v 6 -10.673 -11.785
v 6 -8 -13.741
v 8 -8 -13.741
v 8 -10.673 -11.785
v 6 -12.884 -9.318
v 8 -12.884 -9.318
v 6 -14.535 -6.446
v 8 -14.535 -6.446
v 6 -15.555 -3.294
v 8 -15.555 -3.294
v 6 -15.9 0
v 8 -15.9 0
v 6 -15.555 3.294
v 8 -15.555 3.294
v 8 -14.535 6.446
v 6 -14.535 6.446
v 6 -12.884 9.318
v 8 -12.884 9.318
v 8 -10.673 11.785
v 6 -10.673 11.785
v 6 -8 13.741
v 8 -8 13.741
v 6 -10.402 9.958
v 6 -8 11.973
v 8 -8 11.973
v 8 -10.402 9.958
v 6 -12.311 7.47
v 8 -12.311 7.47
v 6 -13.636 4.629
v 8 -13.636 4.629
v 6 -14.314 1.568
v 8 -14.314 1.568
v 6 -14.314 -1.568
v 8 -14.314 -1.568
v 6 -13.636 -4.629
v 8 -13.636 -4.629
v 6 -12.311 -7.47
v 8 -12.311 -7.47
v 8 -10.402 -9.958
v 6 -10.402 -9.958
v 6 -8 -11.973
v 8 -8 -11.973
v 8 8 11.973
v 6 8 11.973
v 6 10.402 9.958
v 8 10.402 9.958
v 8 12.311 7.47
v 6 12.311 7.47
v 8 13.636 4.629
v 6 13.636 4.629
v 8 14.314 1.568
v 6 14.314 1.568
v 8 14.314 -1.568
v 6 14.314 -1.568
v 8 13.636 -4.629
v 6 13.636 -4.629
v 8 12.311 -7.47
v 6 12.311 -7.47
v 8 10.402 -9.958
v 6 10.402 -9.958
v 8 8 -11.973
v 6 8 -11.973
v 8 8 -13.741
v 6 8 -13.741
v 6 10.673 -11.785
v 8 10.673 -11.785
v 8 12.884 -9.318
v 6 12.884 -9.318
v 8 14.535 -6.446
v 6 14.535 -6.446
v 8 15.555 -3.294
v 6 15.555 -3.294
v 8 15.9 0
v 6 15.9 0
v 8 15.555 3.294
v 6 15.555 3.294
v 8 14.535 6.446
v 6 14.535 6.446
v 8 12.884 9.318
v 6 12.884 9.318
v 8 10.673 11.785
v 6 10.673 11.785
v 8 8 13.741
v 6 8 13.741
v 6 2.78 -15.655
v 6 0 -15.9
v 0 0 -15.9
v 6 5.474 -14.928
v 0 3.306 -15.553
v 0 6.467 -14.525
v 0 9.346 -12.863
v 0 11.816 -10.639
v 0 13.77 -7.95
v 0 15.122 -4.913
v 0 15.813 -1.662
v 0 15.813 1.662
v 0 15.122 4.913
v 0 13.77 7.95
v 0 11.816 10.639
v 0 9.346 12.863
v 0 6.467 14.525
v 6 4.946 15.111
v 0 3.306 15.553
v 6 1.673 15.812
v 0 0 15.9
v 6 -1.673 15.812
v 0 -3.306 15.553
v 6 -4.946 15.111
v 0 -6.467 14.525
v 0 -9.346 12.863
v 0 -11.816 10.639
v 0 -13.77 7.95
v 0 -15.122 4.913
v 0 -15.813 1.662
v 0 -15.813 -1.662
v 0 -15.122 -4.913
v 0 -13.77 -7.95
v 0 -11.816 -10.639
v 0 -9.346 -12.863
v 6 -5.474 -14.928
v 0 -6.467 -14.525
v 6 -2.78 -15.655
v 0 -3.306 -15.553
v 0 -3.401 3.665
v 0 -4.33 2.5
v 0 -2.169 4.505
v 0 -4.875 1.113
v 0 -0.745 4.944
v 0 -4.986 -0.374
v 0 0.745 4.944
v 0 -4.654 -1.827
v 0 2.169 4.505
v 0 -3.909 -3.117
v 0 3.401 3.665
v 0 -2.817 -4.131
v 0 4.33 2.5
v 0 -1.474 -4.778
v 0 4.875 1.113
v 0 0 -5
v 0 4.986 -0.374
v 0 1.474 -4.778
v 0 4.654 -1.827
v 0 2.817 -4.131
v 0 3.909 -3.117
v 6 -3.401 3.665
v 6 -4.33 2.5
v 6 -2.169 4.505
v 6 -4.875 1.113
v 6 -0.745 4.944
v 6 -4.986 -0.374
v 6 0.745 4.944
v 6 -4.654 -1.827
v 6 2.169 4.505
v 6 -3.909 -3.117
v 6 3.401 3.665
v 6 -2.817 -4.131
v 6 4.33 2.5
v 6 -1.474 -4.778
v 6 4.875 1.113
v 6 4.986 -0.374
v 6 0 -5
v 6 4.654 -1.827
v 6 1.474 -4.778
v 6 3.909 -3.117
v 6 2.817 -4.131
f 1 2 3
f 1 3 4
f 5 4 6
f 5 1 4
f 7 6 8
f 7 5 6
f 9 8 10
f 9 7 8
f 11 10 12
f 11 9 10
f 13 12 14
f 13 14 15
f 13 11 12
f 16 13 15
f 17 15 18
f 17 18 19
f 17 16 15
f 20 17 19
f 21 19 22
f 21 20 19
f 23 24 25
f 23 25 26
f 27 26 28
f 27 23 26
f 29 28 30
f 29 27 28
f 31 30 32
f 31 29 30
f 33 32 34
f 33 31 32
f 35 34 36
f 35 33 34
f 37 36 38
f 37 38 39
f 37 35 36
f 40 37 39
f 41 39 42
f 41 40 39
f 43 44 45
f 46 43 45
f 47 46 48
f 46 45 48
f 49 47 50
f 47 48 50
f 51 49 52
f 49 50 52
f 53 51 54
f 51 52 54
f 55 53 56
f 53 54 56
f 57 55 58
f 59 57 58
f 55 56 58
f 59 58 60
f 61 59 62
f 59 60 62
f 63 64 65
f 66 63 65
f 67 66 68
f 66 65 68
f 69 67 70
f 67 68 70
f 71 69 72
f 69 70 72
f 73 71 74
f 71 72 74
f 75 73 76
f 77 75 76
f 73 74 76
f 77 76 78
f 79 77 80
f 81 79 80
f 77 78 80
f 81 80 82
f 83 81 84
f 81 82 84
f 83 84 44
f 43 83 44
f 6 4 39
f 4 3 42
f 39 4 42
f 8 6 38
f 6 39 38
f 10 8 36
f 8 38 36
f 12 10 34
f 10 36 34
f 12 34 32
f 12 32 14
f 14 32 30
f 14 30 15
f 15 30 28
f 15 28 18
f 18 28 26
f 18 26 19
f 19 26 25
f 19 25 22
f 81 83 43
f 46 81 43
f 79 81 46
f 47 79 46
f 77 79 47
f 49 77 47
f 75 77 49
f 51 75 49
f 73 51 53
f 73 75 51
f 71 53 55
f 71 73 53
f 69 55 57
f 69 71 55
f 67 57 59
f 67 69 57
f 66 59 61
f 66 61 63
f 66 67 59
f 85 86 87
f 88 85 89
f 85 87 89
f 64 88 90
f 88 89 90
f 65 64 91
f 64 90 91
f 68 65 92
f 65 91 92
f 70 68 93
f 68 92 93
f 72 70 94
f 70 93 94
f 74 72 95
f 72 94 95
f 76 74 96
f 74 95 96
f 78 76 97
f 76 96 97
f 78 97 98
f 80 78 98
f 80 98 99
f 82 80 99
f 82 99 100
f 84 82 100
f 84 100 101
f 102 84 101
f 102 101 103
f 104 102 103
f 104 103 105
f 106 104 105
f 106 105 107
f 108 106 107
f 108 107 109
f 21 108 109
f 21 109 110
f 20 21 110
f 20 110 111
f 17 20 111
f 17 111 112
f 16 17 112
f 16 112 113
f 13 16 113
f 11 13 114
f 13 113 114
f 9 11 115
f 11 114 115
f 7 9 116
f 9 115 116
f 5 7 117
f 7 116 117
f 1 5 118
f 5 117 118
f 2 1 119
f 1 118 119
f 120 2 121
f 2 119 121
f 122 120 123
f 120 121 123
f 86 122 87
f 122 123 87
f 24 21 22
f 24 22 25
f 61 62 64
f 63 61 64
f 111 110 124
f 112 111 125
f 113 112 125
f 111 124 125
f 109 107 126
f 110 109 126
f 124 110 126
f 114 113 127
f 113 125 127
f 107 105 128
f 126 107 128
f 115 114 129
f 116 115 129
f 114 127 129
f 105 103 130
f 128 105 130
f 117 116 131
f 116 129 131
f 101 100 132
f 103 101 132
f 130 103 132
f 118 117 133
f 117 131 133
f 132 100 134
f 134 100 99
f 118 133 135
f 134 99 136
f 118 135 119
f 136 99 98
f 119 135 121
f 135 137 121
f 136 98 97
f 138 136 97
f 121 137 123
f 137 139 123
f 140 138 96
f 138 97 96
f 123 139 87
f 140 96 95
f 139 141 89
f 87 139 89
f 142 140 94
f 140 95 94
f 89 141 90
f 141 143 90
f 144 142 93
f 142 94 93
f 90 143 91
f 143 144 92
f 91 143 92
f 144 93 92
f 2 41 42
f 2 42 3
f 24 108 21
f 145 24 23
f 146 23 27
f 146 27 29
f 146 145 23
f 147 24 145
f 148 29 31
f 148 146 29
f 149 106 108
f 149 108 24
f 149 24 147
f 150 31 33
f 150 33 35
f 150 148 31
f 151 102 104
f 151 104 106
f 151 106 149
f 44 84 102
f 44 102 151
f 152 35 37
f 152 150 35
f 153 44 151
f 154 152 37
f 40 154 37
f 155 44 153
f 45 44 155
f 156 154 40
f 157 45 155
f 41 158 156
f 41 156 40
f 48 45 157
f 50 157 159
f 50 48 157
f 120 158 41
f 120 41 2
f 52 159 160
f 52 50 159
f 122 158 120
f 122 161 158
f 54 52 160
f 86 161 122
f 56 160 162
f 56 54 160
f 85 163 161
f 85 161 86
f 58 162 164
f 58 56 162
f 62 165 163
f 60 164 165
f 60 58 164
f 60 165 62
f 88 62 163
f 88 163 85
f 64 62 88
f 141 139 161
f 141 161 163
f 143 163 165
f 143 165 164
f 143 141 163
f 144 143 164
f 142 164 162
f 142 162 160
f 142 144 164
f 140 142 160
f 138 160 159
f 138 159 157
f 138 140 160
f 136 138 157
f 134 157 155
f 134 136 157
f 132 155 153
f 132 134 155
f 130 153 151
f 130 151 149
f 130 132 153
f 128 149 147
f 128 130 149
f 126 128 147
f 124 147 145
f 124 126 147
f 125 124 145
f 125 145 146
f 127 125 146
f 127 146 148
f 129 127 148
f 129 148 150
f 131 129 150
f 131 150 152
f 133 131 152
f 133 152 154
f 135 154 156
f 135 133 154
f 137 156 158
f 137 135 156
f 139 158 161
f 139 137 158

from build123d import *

# Parameters (mm, degrees)
SKETCH1_R           = 15.9
SKETCH1_R_2         = 5
BOSS_EXTRUDE1_DEPTH = 6
BOSS_EXTRUDE2_DEPTH = 2


with BuildPart() as part:
    # Sketch1 → Boss-Extrude1 (new body)
    with BuildSketch(Plane(origin=(0, 0, 0), x_dir=(0, 0, -1), z_dir=(1, 0, 0))):
        Circle(SKETCH1_R)
        Circle(SKETCH1_R_2, mode=Mode.SUBTRACT)
    extrude(amount=BOSS_EXTRUDE1_DEPTH)

    # Sketch2 → Boss-Extrude2 (add)
    with BuildSketch(Plane(origin=(6, 0, 0), x_dir=(0, 0, -1), z_dir=(1, 0, 0))):
        with BuildLine():
            Line((11.973303638, -8), (13.740815114, -8))
            ThreePointArc((13.740815114, -8), (0, -15.9), (-13.740815114, -8))
            Line((-13.740815114, -8), (-11.973303638, -8))
            ThreePointArc((-11.973303638, -8), (0, -14.4), (11.973303638, -8))
        make_face()
        with BuildLine():
            Line((-13.740815114, 8), (-11.973303638, 8))
            ThreePointArc((-11.973303638, 8), (0, 14.4), (11.973303638, 8))
            Line((11.973303638, 8), (13.740815114, 8))
            ThreePointArc((13.740815114, 8), (0, 15.9), (-13.740815114, 8))
        make_face()
    extrude(amount=BOSS_EXTRUDE2_DEPTH)


solid = part.part
